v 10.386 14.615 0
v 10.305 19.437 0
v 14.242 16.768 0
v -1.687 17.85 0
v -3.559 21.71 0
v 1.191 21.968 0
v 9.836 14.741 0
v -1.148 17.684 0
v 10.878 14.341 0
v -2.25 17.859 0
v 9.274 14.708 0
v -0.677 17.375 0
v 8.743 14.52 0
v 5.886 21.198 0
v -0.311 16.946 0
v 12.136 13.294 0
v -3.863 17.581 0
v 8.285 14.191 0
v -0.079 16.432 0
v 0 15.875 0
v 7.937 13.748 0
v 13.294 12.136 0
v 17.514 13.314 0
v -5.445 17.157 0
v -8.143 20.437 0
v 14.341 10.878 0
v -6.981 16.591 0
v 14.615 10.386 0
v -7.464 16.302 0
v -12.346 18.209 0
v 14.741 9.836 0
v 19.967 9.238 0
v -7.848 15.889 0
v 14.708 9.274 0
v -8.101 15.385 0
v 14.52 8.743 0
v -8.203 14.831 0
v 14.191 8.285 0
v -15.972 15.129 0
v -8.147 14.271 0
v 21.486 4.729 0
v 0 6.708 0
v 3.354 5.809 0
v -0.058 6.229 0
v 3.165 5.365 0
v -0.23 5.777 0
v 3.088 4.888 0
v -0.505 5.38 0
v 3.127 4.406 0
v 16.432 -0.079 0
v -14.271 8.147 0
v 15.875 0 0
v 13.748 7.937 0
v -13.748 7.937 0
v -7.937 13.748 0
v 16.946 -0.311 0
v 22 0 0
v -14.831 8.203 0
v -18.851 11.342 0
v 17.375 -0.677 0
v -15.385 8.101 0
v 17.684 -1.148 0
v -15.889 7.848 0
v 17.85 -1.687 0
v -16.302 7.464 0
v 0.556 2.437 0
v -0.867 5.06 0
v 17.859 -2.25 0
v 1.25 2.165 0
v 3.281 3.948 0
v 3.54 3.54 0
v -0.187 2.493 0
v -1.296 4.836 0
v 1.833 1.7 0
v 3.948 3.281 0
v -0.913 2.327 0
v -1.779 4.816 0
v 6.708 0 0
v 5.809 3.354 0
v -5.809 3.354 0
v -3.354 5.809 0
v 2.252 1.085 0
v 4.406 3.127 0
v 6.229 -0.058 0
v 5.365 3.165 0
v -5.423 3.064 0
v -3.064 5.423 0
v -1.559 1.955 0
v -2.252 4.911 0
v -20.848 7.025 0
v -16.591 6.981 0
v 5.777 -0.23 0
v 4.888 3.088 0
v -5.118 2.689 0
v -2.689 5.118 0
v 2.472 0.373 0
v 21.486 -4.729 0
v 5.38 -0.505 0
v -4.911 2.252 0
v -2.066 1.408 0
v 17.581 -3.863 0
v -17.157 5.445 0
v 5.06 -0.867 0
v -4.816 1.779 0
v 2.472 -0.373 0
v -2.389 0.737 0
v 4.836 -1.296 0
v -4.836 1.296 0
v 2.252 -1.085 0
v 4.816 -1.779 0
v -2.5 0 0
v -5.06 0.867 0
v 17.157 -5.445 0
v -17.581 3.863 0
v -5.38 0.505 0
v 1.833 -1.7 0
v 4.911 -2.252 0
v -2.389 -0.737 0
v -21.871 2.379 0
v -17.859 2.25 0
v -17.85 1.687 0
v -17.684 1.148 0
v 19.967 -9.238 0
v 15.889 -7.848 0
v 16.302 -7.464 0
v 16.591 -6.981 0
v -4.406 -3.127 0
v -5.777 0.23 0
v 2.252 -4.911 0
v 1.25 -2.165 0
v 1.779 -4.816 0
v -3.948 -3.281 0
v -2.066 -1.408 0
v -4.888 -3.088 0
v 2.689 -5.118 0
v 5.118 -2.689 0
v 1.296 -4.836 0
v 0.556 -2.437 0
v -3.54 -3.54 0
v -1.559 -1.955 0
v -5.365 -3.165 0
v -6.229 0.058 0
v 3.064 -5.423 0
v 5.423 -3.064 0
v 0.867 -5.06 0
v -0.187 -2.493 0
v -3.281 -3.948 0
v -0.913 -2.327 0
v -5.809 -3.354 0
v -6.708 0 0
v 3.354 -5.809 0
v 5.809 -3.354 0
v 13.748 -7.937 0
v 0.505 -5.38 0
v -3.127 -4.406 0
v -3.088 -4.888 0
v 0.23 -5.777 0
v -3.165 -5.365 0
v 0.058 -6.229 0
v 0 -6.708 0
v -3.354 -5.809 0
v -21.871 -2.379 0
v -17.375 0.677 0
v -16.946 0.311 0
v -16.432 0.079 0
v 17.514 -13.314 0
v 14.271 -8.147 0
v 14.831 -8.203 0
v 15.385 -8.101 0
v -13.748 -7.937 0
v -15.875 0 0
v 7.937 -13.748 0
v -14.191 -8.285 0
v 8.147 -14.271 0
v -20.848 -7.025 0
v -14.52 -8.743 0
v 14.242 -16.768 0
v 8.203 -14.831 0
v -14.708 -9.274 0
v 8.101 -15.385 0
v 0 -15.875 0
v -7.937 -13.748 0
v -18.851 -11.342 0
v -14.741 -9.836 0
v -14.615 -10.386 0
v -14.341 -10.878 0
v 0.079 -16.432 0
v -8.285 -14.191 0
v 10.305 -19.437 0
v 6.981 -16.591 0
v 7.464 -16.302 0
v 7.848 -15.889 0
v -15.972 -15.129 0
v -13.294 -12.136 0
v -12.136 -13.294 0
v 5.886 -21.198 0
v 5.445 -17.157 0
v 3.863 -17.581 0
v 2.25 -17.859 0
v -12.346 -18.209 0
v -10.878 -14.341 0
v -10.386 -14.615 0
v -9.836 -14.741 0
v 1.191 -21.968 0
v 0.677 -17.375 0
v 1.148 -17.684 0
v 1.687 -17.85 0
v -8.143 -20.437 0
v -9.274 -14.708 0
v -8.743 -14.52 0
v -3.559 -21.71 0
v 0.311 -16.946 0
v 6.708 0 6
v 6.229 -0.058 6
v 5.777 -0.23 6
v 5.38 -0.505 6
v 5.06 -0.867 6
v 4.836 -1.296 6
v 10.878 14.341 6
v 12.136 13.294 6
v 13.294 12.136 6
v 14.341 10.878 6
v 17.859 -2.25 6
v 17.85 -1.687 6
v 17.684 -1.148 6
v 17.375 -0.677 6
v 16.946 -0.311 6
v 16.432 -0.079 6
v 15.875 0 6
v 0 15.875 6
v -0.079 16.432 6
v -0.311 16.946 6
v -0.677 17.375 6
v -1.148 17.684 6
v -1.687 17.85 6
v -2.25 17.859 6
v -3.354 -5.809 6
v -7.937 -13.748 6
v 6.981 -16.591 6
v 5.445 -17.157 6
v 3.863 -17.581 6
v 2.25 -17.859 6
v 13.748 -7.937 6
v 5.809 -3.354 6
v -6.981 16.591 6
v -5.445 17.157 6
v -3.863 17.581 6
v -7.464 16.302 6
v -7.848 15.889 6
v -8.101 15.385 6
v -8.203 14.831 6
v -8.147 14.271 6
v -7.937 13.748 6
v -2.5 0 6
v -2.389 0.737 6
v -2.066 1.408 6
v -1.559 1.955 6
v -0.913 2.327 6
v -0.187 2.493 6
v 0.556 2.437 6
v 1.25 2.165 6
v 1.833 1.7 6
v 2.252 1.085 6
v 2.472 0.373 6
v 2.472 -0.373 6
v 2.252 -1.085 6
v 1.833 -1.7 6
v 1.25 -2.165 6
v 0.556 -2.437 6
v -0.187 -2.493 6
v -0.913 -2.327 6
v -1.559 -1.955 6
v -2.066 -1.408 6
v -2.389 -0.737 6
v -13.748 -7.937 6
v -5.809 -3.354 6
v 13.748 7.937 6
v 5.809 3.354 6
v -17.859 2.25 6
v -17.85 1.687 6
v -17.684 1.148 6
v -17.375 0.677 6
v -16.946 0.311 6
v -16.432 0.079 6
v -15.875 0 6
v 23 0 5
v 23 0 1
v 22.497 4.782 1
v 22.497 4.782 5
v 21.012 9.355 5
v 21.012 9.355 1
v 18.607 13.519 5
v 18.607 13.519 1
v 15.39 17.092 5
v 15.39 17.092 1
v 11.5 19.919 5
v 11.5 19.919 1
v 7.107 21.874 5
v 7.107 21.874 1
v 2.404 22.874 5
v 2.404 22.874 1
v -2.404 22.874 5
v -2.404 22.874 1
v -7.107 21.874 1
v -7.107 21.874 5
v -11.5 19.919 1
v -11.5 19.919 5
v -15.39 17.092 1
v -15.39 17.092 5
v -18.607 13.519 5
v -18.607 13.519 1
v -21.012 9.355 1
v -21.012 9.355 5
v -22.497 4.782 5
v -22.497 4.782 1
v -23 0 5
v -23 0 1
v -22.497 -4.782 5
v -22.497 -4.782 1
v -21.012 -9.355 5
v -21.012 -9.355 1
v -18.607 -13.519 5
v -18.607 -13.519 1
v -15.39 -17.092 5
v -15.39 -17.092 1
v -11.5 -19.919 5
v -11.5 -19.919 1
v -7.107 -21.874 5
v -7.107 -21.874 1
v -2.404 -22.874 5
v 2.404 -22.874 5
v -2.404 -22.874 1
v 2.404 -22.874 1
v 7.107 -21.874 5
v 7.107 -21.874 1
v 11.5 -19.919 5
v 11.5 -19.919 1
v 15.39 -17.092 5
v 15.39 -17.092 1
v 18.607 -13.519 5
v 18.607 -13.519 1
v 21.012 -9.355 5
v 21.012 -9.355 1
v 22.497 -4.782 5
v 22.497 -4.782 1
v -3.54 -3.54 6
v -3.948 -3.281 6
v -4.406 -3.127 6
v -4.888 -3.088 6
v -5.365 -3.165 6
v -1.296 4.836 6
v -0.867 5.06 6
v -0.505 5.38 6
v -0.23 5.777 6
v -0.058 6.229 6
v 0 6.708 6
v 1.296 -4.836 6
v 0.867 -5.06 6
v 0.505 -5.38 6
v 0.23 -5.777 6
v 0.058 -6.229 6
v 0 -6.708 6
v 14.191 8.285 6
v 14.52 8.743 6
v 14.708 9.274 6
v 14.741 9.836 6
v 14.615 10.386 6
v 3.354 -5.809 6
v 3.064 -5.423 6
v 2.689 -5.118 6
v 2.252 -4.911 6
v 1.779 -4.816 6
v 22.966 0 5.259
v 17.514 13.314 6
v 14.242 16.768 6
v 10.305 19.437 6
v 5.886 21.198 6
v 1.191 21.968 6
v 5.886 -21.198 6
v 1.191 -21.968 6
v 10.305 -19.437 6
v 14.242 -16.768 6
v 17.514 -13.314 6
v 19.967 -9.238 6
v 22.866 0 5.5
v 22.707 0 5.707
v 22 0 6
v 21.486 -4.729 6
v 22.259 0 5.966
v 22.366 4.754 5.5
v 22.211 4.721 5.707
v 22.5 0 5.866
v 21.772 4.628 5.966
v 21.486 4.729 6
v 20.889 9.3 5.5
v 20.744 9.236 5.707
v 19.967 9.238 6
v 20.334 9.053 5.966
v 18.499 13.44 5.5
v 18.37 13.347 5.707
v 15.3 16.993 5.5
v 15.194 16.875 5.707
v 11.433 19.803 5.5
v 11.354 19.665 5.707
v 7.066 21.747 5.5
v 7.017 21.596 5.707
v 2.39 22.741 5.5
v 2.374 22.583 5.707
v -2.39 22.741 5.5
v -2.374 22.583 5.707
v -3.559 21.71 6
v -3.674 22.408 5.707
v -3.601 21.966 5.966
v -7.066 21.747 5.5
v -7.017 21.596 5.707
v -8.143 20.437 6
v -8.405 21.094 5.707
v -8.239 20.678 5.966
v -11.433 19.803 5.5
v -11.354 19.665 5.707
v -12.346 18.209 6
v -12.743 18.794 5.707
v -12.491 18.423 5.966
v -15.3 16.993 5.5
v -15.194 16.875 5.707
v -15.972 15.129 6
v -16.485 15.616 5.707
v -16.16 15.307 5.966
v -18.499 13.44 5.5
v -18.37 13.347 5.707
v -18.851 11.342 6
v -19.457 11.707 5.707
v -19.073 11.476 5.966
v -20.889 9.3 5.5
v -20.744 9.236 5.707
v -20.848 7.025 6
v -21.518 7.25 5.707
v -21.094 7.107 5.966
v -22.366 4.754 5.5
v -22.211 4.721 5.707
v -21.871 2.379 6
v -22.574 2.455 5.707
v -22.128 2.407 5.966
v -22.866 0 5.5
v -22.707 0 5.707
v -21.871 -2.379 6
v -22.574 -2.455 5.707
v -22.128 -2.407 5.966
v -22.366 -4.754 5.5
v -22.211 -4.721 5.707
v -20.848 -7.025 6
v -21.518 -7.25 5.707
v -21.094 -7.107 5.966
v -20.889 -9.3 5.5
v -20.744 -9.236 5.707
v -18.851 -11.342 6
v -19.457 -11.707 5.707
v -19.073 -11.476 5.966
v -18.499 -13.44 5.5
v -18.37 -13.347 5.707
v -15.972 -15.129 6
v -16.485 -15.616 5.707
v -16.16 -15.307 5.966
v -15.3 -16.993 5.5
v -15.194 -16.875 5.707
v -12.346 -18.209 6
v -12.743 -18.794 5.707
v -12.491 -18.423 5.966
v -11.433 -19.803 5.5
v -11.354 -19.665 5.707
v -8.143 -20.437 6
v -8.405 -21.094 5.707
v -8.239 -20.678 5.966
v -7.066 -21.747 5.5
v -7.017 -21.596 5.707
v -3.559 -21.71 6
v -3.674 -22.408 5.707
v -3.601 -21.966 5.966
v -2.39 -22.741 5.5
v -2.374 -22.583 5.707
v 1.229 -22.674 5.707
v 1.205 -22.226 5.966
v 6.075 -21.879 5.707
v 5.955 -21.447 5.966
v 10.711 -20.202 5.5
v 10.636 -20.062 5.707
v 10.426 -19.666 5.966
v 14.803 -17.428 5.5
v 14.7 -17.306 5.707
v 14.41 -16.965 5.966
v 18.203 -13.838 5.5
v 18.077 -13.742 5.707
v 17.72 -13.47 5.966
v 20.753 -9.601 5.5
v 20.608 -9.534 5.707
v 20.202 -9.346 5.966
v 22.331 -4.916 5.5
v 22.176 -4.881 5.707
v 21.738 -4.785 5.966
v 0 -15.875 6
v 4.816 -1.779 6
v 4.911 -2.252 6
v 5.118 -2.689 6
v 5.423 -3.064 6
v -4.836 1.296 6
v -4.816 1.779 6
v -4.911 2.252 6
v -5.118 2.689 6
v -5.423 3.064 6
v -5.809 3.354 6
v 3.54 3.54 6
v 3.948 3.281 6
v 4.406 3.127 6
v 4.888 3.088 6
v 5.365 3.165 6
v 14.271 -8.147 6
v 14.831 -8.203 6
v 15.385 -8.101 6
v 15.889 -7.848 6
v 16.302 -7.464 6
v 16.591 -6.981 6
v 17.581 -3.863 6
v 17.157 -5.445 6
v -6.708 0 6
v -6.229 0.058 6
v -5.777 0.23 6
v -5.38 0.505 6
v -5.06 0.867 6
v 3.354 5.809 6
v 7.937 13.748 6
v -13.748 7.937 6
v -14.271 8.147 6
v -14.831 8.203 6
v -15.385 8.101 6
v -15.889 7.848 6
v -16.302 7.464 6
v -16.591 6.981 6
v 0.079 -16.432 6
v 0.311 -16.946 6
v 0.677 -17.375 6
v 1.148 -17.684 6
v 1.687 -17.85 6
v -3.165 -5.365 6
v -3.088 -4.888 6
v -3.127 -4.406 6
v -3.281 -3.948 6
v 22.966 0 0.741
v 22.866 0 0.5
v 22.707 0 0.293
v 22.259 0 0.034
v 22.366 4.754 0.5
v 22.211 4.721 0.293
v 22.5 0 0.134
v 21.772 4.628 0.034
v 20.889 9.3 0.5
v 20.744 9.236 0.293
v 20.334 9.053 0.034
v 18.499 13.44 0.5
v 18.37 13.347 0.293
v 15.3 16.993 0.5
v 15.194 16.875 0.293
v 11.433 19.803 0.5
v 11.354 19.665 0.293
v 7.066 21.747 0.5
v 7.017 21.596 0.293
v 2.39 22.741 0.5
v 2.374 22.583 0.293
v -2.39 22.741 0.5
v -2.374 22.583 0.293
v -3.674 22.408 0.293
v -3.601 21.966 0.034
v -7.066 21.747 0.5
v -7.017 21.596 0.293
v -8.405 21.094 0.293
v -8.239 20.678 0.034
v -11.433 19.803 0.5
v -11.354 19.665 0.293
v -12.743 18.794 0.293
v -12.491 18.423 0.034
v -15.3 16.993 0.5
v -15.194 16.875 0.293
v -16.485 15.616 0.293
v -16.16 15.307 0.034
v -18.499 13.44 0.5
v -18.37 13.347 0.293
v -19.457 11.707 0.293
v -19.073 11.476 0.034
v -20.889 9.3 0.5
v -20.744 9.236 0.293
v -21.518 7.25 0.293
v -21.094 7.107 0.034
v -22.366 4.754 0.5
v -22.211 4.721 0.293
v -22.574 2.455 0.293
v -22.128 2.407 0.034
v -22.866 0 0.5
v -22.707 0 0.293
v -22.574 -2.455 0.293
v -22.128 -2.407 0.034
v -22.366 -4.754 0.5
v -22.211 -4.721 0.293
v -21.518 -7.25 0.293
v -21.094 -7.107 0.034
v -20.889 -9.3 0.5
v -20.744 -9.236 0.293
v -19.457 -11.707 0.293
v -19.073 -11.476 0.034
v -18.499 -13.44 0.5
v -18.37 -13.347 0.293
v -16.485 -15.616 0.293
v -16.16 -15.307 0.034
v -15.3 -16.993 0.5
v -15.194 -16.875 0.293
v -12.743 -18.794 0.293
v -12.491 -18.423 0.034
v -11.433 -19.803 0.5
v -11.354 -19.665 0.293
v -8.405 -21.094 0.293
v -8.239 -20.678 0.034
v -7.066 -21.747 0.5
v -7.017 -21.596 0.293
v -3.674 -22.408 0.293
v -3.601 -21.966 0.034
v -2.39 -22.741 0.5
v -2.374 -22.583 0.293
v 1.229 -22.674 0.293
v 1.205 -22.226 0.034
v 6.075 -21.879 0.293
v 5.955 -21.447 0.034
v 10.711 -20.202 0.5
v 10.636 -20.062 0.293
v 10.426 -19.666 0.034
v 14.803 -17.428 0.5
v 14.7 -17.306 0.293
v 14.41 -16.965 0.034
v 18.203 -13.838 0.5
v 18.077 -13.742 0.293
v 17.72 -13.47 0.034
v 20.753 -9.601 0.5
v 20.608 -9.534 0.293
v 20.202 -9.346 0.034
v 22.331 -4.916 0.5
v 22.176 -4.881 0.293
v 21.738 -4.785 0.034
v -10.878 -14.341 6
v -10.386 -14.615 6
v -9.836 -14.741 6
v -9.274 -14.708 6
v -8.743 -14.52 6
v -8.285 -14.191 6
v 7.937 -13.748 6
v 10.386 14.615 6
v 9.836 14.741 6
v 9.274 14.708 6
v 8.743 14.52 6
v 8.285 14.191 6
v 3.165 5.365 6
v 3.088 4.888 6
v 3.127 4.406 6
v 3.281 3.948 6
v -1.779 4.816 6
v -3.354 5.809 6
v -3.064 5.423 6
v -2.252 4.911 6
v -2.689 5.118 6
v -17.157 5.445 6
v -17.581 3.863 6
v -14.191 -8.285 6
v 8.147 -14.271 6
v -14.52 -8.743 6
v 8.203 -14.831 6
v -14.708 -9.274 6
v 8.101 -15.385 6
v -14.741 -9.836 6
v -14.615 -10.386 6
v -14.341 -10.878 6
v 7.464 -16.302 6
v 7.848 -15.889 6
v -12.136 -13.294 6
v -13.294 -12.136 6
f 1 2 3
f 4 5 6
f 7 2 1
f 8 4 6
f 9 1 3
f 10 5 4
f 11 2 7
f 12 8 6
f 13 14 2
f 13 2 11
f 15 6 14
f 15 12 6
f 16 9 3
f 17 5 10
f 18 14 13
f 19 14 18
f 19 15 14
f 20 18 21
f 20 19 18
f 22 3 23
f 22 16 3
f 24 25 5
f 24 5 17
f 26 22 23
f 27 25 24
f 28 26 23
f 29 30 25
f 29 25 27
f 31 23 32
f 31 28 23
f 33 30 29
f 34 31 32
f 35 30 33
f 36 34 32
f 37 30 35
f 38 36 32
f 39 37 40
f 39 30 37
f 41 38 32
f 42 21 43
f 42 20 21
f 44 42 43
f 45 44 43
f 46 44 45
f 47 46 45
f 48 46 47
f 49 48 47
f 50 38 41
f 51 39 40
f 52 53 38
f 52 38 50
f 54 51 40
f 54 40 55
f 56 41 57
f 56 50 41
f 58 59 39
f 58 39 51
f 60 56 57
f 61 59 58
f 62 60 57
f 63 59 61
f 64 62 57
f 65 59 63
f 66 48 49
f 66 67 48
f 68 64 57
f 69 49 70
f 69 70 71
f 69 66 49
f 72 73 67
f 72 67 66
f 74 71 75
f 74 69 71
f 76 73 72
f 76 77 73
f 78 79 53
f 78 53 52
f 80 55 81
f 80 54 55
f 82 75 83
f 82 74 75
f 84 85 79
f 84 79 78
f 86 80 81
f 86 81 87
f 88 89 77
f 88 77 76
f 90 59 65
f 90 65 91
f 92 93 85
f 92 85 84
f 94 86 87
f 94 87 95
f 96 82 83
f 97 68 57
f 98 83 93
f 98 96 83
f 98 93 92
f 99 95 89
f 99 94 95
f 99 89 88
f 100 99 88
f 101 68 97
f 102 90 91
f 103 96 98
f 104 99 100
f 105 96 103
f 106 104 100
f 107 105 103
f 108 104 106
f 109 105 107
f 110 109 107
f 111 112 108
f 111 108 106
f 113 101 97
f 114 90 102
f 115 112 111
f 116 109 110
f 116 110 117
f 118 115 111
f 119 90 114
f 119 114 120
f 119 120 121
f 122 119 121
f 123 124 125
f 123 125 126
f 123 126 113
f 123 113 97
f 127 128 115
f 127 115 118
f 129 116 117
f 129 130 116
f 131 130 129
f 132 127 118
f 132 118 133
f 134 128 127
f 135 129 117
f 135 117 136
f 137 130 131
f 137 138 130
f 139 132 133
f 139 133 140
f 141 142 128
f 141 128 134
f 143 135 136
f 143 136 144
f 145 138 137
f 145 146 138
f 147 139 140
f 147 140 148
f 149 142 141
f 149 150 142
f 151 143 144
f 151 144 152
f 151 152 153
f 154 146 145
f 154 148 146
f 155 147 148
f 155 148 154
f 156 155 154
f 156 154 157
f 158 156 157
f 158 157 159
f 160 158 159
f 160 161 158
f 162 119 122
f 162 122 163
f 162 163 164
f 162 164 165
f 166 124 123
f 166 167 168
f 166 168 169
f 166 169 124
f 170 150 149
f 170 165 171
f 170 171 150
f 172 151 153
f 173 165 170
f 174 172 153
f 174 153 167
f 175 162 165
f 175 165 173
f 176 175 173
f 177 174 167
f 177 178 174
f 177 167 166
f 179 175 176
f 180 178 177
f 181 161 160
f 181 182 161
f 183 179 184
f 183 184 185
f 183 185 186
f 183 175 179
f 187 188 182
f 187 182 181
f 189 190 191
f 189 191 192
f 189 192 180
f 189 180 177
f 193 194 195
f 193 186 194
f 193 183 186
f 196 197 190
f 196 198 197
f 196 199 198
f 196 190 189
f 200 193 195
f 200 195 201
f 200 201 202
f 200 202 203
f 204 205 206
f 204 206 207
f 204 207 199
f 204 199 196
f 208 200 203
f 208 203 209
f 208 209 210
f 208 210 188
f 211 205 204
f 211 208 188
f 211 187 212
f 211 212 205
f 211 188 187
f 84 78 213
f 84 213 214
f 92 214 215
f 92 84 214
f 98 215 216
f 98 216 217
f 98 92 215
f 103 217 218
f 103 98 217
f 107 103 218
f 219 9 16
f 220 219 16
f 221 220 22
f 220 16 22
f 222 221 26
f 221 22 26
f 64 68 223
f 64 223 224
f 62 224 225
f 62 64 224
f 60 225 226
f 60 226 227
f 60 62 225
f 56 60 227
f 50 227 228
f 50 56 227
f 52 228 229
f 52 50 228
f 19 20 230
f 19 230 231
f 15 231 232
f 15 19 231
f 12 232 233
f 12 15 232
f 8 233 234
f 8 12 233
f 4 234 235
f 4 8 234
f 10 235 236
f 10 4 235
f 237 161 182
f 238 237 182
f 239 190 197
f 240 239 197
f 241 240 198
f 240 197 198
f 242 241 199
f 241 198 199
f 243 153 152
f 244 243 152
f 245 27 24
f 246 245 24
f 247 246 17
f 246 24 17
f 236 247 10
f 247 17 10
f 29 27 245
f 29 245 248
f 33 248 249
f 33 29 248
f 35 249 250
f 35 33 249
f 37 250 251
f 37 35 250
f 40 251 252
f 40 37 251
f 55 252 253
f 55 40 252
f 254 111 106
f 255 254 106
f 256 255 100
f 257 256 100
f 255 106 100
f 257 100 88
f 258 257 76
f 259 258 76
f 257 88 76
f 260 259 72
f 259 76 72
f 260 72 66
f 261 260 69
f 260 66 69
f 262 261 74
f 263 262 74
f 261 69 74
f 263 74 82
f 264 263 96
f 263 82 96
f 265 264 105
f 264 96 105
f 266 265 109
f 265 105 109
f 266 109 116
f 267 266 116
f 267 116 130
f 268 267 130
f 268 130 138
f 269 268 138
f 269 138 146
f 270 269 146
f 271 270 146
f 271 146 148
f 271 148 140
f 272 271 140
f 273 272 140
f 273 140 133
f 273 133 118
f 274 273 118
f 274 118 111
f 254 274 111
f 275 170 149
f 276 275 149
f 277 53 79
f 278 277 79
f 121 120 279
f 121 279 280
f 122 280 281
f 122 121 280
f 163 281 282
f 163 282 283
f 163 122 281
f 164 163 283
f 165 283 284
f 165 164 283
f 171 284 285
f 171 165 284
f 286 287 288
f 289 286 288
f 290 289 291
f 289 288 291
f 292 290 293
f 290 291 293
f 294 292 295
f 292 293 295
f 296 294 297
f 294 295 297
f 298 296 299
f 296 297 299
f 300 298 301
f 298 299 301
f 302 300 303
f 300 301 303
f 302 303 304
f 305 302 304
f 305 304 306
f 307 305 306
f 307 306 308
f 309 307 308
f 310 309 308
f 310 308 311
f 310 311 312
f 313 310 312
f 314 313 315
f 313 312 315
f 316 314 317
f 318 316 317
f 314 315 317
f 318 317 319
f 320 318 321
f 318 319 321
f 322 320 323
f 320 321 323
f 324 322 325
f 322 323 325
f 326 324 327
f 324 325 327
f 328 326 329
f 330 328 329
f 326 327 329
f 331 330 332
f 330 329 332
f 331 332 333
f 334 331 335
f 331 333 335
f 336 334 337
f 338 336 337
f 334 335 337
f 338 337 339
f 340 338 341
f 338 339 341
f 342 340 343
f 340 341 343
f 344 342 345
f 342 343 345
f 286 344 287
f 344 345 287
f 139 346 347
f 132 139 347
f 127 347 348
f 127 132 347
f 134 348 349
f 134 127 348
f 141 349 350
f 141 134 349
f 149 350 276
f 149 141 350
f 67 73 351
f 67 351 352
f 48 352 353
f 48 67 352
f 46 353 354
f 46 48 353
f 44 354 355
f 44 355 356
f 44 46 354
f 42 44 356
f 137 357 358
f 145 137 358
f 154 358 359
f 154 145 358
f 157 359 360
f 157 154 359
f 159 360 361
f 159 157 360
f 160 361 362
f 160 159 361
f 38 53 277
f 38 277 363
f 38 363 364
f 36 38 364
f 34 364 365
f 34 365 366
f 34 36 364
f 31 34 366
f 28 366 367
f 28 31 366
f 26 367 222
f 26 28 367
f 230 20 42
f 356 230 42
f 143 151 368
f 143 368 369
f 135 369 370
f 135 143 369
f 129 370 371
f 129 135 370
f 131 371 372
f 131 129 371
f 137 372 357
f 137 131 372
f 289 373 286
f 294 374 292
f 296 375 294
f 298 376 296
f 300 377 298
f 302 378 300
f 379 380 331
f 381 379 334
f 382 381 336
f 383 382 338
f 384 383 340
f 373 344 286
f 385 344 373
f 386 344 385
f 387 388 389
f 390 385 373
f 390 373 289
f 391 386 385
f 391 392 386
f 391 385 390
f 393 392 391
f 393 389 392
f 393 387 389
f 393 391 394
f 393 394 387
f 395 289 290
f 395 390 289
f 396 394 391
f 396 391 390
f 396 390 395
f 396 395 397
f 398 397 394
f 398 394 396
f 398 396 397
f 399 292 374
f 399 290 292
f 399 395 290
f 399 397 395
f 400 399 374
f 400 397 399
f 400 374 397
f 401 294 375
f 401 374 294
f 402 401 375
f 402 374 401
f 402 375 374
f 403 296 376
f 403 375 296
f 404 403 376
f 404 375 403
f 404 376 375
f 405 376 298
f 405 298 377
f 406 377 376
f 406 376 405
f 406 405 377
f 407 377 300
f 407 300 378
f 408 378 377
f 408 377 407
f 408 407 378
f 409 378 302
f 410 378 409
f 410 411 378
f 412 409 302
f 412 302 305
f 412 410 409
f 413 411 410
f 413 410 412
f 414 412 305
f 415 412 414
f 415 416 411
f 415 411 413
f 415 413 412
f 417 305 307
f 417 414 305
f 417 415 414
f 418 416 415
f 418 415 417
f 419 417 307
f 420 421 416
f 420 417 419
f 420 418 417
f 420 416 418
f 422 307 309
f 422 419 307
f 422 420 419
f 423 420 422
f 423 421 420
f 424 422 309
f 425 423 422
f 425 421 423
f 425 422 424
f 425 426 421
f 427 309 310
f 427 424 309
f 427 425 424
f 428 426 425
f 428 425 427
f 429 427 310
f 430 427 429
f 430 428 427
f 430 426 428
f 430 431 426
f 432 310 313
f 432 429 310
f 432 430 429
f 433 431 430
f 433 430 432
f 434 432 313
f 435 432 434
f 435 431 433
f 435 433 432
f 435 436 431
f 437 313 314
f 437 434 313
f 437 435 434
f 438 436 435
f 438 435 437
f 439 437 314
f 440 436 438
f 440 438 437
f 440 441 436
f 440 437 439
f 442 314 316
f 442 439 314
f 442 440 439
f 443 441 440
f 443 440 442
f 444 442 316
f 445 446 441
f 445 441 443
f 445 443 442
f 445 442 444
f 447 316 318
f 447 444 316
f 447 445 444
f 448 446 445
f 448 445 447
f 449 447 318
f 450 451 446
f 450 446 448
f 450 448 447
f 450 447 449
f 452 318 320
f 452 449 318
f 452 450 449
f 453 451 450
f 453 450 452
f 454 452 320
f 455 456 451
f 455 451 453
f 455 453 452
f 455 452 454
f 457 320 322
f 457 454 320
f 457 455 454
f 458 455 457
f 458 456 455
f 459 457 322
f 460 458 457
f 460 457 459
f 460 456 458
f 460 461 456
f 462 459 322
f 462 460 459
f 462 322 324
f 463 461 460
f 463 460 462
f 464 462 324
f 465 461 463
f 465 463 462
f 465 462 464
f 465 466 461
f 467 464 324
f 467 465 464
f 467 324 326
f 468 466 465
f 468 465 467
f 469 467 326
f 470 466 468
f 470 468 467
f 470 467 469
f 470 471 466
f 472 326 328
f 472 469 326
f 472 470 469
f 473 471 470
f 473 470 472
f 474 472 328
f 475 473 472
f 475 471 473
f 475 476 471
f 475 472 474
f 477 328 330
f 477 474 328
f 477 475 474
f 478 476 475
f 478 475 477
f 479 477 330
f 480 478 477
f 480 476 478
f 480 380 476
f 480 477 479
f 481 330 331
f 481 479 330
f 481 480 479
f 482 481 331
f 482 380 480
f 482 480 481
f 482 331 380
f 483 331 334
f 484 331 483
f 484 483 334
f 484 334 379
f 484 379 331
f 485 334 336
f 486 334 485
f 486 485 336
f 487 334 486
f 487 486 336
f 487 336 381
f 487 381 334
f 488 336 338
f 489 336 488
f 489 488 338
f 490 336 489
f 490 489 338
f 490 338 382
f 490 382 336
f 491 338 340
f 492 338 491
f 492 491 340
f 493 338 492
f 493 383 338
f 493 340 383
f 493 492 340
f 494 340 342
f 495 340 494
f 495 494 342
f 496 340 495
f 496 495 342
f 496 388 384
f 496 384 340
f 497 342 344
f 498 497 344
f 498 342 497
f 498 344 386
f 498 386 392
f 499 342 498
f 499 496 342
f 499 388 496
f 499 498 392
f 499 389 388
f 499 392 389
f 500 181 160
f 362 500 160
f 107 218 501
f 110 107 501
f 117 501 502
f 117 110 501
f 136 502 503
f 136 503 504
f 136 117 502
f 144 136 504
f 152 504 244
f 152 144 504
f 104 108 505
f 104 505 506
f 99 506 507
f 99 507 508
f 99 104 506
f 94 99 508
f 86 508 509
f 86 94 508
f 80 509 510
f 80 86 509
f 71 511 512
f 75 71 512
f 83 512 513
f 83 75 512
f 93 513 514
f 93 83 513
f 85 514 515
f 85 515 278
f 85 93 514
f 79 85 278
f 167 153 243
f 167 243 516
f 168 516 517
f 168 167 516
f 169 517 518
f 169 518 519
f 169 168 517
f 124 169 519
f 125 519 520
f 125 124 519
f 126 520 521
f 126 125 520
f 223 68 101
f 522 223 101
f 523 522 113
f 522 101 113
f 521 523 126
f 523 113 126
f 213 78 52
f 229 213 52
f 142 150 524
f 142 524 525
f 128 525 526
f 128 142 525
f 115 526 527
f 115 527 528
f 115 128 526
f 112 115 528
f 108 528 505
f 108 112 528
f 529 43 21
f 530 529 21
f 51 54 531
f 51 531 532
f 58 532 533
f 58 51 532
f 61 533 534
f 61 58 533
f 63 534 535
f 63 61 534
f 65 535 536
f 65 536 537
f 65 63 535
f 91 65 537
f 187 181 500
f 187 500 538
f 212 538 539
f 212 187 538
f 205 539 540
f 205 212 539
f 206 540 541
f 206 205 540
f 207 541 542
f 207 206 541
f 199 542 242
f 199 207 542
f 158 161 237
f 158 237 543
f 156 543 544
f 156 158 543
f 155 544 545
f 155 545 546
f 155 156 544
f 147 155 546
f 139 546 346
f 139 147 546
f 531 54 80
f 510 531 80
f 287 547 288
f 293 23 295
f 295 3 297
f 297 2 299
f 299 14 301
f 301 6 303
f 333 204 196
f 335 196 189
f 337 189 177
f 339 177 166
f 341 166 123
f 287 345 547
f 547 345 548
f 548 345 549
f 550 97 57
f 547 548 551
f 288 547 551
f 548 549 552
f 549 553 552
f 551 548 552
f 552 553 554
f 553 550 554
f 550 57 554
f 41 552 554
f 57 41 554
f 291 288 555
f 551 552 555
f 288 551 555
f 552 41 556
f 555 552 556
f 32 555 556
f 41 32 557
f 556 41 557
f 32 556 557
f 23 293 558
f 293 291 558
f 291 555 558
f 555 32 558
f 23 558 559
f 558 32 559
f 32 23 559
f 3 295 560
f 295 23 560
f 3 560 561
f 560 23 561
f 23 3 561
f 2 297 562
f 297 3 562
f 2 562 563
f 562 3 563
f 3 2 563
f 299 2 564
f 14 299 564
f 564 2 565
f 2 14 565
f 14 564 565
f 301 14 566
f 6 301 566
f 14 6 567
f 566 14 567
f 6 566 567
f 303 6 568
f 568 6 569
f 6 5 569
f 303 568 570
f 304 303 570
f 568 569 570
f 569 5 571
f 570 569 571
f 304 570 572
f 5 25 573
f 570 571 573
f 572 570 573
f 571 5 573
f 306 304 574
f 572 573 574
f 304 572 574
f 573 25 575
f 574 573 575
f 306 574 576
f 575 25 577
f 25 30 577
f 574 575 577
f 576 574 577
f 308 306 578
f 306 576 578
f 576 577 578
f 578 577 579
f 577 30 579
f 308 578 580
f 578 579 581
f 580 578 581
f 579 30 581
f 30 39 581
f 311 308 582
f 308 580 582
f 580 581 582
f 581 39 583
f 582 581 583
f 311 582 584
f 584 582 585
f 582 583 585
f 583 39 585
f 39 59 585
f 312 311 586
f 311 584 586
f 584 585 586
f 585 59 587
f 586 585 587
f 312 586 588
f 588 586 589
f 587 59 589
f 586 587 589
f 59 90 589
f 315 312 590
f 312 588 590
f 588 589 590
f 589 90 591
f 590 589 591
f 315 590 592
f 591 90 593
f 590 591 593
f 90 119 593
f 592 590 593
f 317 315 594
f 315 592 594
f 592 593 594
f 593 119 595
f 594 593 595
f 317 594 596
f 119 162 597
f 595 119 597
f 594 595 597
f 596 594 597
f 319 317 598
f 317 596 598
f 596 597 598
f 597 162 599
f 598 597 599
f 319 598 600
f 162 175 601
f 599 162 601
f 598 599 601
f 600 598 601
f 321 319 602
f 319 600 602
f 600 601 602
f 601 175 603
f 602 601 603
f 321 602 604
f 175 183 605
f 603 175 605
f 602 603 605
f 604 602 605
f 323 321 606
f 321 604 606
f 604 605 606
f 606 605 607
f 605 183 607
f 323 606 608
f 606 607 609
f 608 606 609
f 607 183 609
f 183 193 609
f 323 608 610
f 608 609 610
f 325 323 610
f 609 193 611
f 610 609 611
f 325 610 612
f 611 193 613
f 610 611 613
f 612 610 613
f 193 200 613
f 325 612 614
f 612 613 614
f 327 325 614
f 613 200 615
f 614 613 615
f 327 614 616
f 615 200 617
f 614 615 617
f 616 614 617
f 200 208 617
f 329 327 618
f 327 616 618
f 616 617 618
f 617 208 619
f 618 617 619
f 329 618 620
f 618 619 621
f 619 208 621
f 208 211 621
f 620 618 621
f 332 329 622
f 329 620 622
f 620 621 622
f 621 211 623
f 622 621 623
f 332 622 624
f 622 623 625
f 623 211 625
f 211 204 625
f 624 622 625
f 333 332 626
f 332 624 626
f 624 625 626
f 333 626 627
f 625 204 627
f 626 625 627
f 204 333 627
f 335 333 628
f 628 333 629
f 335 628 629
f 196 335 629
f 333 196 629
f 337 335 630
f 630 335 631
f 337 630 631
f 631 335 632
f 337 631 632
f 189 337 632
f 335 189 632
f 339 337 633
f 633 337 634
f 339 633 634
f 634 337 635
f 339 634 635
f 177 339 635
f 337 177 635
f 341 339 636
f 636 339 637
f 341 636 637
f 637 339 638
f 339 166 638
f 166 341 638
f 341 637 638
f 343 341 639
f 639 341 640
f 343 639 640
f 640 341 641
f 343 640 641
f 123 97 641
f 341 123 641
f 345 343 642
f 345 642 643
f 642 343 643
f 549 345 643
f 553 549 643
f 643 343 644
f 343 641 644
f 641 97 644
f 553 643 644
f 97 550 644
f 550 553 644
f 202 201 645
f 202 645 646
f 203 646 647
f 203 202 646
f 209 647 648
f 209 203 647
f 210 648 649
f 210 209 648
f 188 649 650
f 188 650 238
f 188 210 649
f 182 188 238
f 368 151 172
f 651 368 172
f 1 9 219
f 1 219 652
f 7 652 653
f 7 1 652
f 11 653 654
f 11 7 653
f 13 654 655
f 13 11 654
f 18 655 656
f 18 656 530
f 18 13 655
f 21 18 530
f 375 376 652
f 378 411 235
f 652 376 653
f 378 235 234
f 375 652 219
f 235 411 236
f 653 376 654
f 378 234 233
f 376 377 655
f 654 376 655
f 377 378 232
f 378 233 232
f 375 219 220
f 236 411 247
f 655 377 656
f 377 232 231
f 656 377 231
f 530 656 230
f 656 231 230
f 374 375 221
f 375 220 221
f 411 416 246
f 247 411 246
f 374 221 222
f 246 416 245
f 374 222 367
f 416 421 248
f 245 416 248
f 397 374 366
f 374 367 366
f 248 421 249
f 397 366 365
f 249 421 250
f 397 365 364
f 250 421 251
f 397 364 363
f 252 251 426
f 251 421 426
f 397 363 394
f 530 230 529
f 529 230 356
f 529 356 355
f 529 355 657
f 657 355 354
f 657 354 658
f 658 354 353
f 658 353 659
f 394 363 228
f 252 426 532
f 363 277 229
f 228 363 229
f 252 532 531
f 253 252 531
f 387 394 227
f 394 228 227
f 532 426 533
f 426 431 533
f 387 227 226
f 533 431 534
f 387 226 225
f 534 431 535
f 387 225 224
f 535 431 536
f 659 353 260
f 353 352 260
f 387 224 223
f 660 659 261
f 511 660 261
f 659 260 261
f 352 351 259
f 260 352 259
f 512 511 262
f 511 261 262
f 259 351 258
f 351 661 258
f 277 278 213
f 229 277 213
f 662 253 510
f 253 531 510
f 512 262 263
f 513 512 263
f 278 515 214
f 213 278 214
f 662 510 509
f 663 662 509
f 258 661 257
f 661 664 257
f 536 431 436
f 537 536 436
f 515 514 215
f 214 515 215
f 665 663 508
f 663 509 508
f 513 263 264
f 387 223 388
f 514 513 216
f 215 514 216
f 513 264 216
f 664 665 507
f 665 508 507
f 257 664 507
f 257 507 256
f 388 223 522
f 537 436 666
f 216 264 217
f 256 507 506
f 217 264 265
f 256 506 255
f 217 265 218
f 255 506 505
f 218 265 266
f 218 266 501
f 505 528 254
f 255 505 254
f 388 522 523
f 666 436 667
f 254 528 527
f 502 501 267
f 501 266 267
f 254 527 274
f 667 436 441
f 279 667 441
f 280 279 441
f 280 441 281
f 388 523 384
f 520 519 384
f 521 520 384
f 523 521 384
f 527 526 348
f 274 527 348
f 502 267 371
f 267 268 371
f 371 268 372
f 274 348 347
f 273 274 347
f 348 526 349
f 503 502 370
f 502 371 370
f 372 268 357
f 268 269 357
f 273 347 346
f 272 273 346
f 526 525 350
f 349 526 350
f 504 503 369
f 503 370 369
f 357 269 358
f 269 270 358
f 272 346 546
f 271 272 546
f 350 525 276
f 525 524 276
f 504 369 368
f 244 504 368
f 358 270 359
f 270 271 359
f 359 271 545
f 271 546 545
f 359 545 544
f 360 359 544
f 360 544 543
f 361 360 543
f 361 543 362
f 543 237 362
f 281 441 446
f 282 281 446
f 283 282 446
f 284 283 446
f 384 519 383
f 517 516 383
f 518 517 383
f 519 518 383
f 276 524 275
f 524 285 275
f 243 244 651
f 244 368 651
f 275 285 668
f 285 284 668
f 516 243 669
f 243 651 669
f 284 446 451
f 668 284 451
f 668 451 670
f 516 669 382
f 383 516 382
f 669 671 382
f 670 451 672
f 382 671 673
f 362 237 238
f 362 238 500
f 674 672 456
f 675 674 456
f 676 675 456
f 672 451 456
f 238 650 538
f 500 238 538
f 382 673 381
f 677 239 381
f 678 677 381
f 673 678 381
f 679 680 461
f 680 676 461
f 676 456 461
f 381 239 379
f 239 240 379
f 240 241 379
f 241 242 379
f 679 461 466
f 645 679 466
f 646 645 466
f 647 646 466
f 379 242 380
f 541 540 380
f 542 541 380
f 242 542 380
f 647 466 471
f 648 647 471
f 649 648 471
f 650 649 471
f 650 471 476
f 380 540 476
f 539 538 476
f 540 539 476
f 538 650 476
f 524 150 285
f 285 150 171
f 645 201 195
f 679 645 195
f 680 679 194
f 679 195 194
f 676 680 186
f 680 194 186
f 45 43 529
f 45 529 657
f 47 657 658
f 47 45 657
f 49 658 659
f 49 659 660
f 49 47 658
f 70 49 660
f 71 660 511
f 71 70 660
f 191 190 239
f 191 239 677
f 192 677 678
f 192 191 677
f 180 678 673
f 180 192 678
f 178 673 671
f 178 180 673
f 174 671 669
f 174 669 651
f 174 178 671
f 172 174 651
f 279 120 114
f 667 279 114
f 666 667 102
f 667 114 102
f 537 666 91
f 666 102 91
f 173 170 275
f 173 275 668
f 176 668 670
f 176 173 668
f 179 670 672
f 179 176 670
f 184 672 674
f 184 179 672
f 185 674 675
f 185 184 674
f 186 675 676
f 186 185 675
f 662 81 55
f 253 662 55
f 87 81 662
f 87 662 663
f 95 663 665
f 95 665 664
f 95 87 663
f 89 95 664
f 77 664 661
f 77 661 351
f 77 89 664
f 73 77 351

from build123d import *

# Parameters (mm, degrees)
SKETCH1_R           = 23
BOSS_EXTRUDE1_DEPTH = 6
FILLET1_R           = 1
CUT_EXTRUDE1_DEPTH  = 34.075670817082454
SKETCH3_R           = 2.5
CUT_EXTRUDE2_DEPTH  = 8
FILLET2_R           = 2


with BuildPart() as part:
    # Sketch1 → Boss-Extrude1 (new body)
    with BuildSketch(Plane.XY):
        Circle(SKETCH1_R)
    extrude(amount=BOSS_EXTRUDE1_DEPTH)

    # Fillet1
    fillet1_edges = [part.edges().sort_by_distance(p)[0] for p in [
        (-23, 2.82e-15, 0),
        (-23, 2.82e-15, 6),
    ]]
    fillet(fillet1_edges, radius=FILLET1_R)

    # Sketch2 → Cut-Extrude1 (cut, through all)
    with BuildSketch(Plane(origin=(0, 0, 0), x_dir=(-1, 0, 0), z_dir=(0, 0, -1))):
        with BuildLine():
            Line((0, 18), (0, 4.999999999999997))
            ThreePointArc((0, 4.999999999999997), (1.2940952255126064, 4.829629131445338), (2.500000000000004, 4.330127018922188))
            Line((2.500000000000004, 4.330127018922188), (9.000000000000016, 15.588457268119884))
            ThreePointArc((9.000000000000016, 15.588457268119884), (4.658742811845384, 17.386664873203223), (0, 18))
        make_face()
        with BuildLine():
            Line((15.588457268119916, 8.999999999999963), (4.330127018922196, 2.499999999999989))
            ThreePointArc((4.330127018922196, 2.499999999999989), (4.829629131445343, 1.294095225512589), (4.999999999999997, -1.746e-14))
            Line((4.999999999999997, -1.746e-14), (18, -6.285e-14))
            ThreePointArc((18, -6.285e-14), (17.386664873203244, 4.658742811845323), (15.588457268119916, 8.999999999999963))
        make_face()
        with BuildLine():
            Line((15.588457268119898, -8.999999999999995), (4.330127018922192, -2.4999999999999973))
            ThreePointArc((4.330127018922192, -2.4999999999999973), (3.5355339059327373, -3.5355339059327355), (2.500000000000001, -4.330127018922191))
            Line((2.500000000000001, -4.330127018922191), (9.000000000000007, -15.588457268119889))
            ThreePointArc((9.000000000000007, -15.588457268119889), (12.72792206135786, -12.727922061357848), (15.588457268119898, -8.999999999999995))
        make_face()
        with BuildLine():
            Line((3.97e-15, -18), (9.6e-16, -4.999999999999997))
            ThreePointArc((9.6e-16, -4.999999999999997), (-1.2940952255126013, -4.82962913144534), (-2.499999999999997, -4.330127018922192))
            Line((-2.499999999999997, -4.330127018922192), (-8.999999999999993, -15.588457268119898))
            ThreePointArc((-8.999999999999993, -15.588457268119898), (-4.658742811845367, -17.38666487320323), (3.97e-15, -18))
        make_face()
        with BuildLine():
            Line((-15.588457268119889, -9.000000000000009), (-4.330127018922191, -2.5000000000000013))
            ThreePointArc((-4.330127018922191, -2.5000000000000013), (-4.829629131445345, -1.2940952255125773), (-4.9999999999999964, 5.237e-14))
            Line((-4.9999999999999964, 5.237e-14), (-18, 5.83e-15))
            ThreePointArc((-18, 5.83e-15), (-17.38666487320323, -4.658742811845374), (-15.588457268119889, -9.000000000000009))
        make_face()
        with BuildLine():
            Line((-15.58845726811979, 9.000000000000181), (-4.330127018922163, 2.500000000000049))
            ThreePointArc((-4.330127018922163, 2.500000000000049), (-3.5355339059326933, 3.5355339059327786), (-2.499999999999943, 4.330127018922223))
            Line((-2.499999999999943, 4.330127018922223), (-8.9999999999998, 15.588457268120008))
            ThreePointArc((-8.9999999999998, 15.588457268120008), (-12.7279220613577, 12.727922061358008), (-15.58845726811979, 9.000000000000181))
        make_face()
    extrude(amount=-CUT_EXTRUDE1_DEPTH, mode=Mode.SUBTRACT)

    # Sketch3 → Cut-Extrude2 (cut)
    with BuildSketch(Plane(origin=(0, 0, 0), x_dir=(-1, 0, 0), z_dir=(0, 0, -1))):
        Circle(SKETCH3_R)
    extrude(amount=-CUT_EXTRUDE2_DEPTH, mode=Mode.SUBTRACT)

    # Fillet2
    # the kernel refuses this fillet: 2 mm, written as the material it adds along each edge
    with BuildSketch(Plane(origin=(8.9999999999998, 15.58845726812001, 0), x_dir=(0.8330141641507608, -0.5532516627396699, 0), z_dir=(0, 0, 1))) as fillet2_piece_1:
        with BuildLine():
            CenterArc((2.1291790264677095, -1.996074518473306), FILLET2_R, 86.40962210927087, 97.18075578145812)
            Line((0.13310450799440263, -2.121320343559637), (0, 0))
            ThreePointArc((0, 0), (1.127212425777022, 0.03532933374024082), (2.2544248515540453, -1.2e-16))
        make_face()
    extrude(amount=6)
    with BuildSketch(Plane(origin=(15.58845726811979, 9.000000000000181, 0), x_dir=(-0.5532516627396912, 0.8330141641507466, 0), z_dir=(0, 0, 1))) as fillet2_piece_2:
        with BuildLine():
            CenterArc((2.1291790264677095, 1.9960745184733064), FILLET2_R, 176.40962210927088, 97.18075578145823)
            Line((0.13310450799440354, 2.1213203435596415), (0, 0))
            ThreePointArc((0, 0), (1.127212425777022, -0.03532933374024257), (2.2544248515540453, 9e-17))
        make_face()
    extrude(amount=6)
    with BuildSketch(Plane(origin=(2.499999999999943, 4.330127018922223, 0), x_dir=(0.4999999999999891, 0.8660254037844449, 0), z_dir=(0, 0, 1))) as fillet2_piece_3:
        with BuildLine():
            CenterArc((1.7082039324998066, -1.9999999999999998), FILLET2_R, 90.00000000000001, 73.39845040098082)
            ThreePointArc((-0.2084257625000237, -1.4285714285714644), (-0.05238081560950268, -0.7218479107478997), (0, 0))
            Line((0, 0), (1.7082039324998062, 0))
        make_face()
    extrude(amount=6)
    with BuildSketch(Plane(origin=(4.330127018922163, 2.5000000000000484, 0), x_dir=(0.8660254037844327, 0.5000000000000103, 0), z_dir=(0, 0, 1))) as fillet2_piece_4:
        with BuildLine():
            CenterArc((1.708203932499807, 2), FILLET2_R, 196.6015495990192, 73.39845040098078)
            ThreePointArc((-0.20842576250002318, 1.428571428571463), (-0.05238081560950245, 0.7218479107478992), (0, 0))
            Line((0, 0), (1.7082039324998068, -6e-17))
        make_face()
    extrude(amount=6)
    with BuildSketch(Plane(origin=(15.588457268119889, -9.000000000000009, 0), x_dir=(-0.8660254037844383, 0.5000000000000009, 0), z_dir=(0, 0, 1))) as fillet2_piece_5:
        with BuildLine():
            CenterArc((2.1254921336124535, -2), FILLET2_R, 89.99999999999999, 97.18075578145834)
            ThreePointArc((0.14117865031401003, -2.250000000000001), (0.03532933374023933, -1.1272124257770224), (0, 0))
            Line((0, 0), (2.125492133612454, -1.1e-16))
        make_face()
    extrude(amount=6)
    with BuildSketch(Plane(origin=(18, 5.83e-15, 0), x_dir=(-1, 3.63e-15, 0), z_dir=(0, 0, 1))) as fillet2_piece_6:
        with BuildLine():
            CenterArc((2.1254921336124433, 2), FILLET2_R, 172.81924421854202, 97.18075578145795)
            ThreePointArc((0.14117865031399895, 2.2499999999999902), (0.03532933374023574, 1.1272124257770182), (0, 0))
            Line((0, 0), (2.1254921336124433, 0))
        make_face()
    extrude(amount=6)
    with BuildSketch(Plane(origin=(4.330127018922191, -2.5000000000000018, 0), x_dir=(0.36973419276377445, 0.9291375714614709, 0), z_dir=(0, 0, 1))) as fillet2_piece_7:
        with BuildLine():
            CenterArc((1.7324349857948858, -1.9790476737562004), FILLET2_R, 98.30077479950961, 73.39845040099217)
            Line((-0.2466126879613723, -1.690308509457446), (0, 0))
            ThreePointArc((0, 0), (0.7218479107478688, -0.05238081560949556), (1.4436958214957383, 0))
        make_face()
    extrude(amount=6)
    with BuildSketch(Plane(origin=(4.9999999999999964, 5.25e-14, 0), x_dir=(-0.14436958214956583, -0.9895238368781015, 0), z_dir=(0, 0, 1))) as fillet2_piece_8:
        with BuildLine():
            CenterArc((1.7324349857949062, 1.9790476737562006), FILLET2_R, 188.3007747994978, 73.39845040099254)
            Line((-0.246612687961354, 1.6903085094574617), (0, 0))
            ThreePointArc((0, 0), (0.7218479107478792, 0.05238081560949936), (1.4436958214957574, 0))
        make_face()
    extrude(amount=6)
    with BuildSketch(Plane(origin=(-3.43e-15, -18, 0), x_dir=(0.9980372592366533, 0.06262291254316825, 0), z_dir=(0, 0, 1))) as fillet2_piece_9:
        with BuildLine():
            CenterArc((2.129179026467711, 1.996074518473307), FILLET2_R, 176.4096221092709, 97.18075578145829)
            Line((0.13310450799440432, 2.121320343559642), (0, 0))
            ThreePointArc((0, 0), (1.1272124257770224, -0.03532933374023745), (2.254424851554048, 3e-17))
        make_face()
    extrude(amount=6)
    with BuildSketch(Plane(origin=(8.999999999999993, -15.588457268119898, 0), x_dir=(-0.8956370766939215, -0.44478559649697147, 0), z_dir=(0, 0, 1))) as fillet2_piece_10:
        with BuildLine():
            CenterArc((2.129179026467713, -1.9960745184733077), FILLET2_R, 86.40962210927084, 97.1807557814584)
            Line((0.1331045079944061, -2.121320343559647), (0, 0))
            ThreePointArc((0, 0), (1.1272124257770244, 0.03532933374023982), (2.2544248515540497, 8e-17))
        make_face()
    extrude(amount=6)
    with BuildSketch(Plane(origin=(2.4999999999999973, -4.330127018922191, 0), x_dir=(0.4999999999999994, -0.8660254037844389, 0), z_dir=(0, 0, 1))) as fillet2_piece_11:
        with BuildLine():
            CenterArc((1.7082039324998068, -1.9999999999999998), FILLET2_R, 90.00000000000001, 73.39845040098074)
            ThreePointArc((-0.20842576250002273, -1.428571428571461), (-0.05238081560950084, -0.7218479107478981), (0, 0))
            Line((0, 0), (1.7082039324998066, 2e-17))
        make_face()
    extrude(amount=6)
    with BuildSketch(Plane(origin=(-9.6e-16, -4.9999999999999964, 0), x_dir=(-2.2e-16, -1, 0), z_dir=(0, 0, 1))) as fillet2_piece_12:
        with BuildLine():
            CenterArc((1.7082039324998068, 2), FILLET2_R, 196.6015495990192, 73.39845040098078)
            ThreePointArc((-0.2084257625000235, 1.4285714285714635), (-0.0523808156095013, 0.7218479107478993), (0, 0))
            Line((0, 0), (1.7082039324998064, 0))
        make_face()
    extrude(amount=6)
    with BuildSketch(Plane(origin=(-9.000000000000007, -15.588457268119889, 0), x_dir=(-0.8330141641507522, 0.5532516627396828, 0), z_dir=(0, 0, 1))) as fillet2_piece_13:
        with BuildLine():
            CenterArc((2.1291790264677144, -1.9960745184733075), FILLET2_R, 86.40962210927094, 97.18075578145817)
            Line((0.13310450799440787, -2.121320343559643), (0, 0))
            ThreePointArc((0, 0), (1.1272124257770235, 0.03532933374024261), (2.2544248515540475, 4e-17))
        make_face()
    extrude(amount=6)
    with BuildSketch(Plane(origin=(-2.500000000000001, -4.330127018922191, 0), x_dir=(-0.5000000000000007, -0.8660254037844384, 0), z_dir=(0, 0, 1))) as fillet2_piece_14:
        with BuildLine():
            CenterArc((1.7082039324998013, -2), FILLET2_R, 90.00000000000001, 73.39845040098085)
            ThreePointArc((-0.20842576250002953, -1.428571428571465), (-0.05238081560950266, -0.7218479107479008), (0, 0))
            Line((0, 0), (1.7082039324998008, -1e-17))
        make_face()
    extrude(amount=6)
    with BuildSketch(Plane(origin=(-4.330127018922191, -2.4999999999999973, 0), x_dir=(-0.8660254037844389, -0.4999999999999994, 0), z_dir=(0, 0, 1))) as fillet2_piece_15:
        with BuildLine():
            CenterArc((1.7082039324998053, 2), FILLET2_R, 196.60154959901914, 73.39845040098089)
            ThreePointArc((-0.20842576250002512, 1.428571428571465), (-0.05238081560950129, 0.7218479107479002), (0, 0))
            Line((0, 0), (1.7082039324998066, -2e-17))
        make_face()
    extrude(amount=6)
    with BuildSketch(Plane(origin=(-15.588457268119896, -8.999999999999996, 0), x_dir=(0.5532516627396812, -0.8330141641507532, 0), z_dir=(0, 0, 1))) as fillet2_piece_16:
        with BuildLine():
            CenterArc((2.129179026467709, 1.996074518473306), FILLET2_R, 176.4096221092708, 97.18075578145829)
            Line((0.1331045079944023, 2.1213203435596437), (0, 0))
            ThreePointArc((0, 0), (1.127212425777022, -0.03532933374023939), (2.2544248515540444, -1.1e-16))
        make_face()
    extrude(amount=6)
    with BuildSketch(Plane(origin=(-4.999999999999998, -1.714e-14, 0), x_dir=(-1, -3.62e-15, 0), z_dir=(0, 0, 1))) as fillet2_piece_17:
        with BuildLine():
            CenterArc((1.7082039324997937, -2), FILLET2_R, 90, 73.39845040098072)
            ThreePointArc((-0.20842576250003547, -1.4285714285714597), (-0.05238081560950375, -0.7218479107478981), (0, 0))
            Line((0, 0), (1.708203932499794, 0))
        make_face()
    extrude(amount=6)
    with BuildSketch(Plane(origin=(-4.330127018922196, 2.499999999999989, 0), x_dir=(-0.8660254037844398, 0.49999999999999784, 0), z_dir=(0, 0, 1))) as fillet2_piece_18:
        with BuildLine():
            CenterArc((1.7082039324998106, 2), FILLET2_R, 196.60154959901917, 73.39845040098083)
            ThreePointArc((-0.20842576250002, 1.4285714285714646), (-0.05238081560950151, 0.7218479107478999), (0, 0))
            Line((0, 0), (1.708203932499811, -2e-17))
        make_face()
    extrude(amount=6)
    with BuildSketch(Plane(origin=(-18, -6.285e-14, 0), x_dir=(0.06262291254316511, 0.9980372592366534, 0), z_dir=(0, 0, 1))) as fillet2_piece_19:
        with BuildLine():
            CenterArc((2.129179026467712, -1.996074518473306), FILLET2_R, 86.4096221092709, 97.18075578145834)
            Line((0.13310450799440612, -2.121320343559647), (0, 0))
            ThreePointArc((0, 0), (1.1272124257770233, 0.0353293337402411), (2.254424851554047, 0))
        make_face()
    extrude(amount=6)
    with BuildSketch(Plane(origin=(-15.588457268119917, 8.999999999999963, 0), x_dir=(-0.4447855964969697, -0.8956370766939222, 0), z_dir=(0, 0, 1))) as fillet2_piece_20:
        with BuildLine():
            CenterArc((2.1291790264677113, 1.9960745184733066), FILLET2_R, 176.40962210927077, 97.18075578145834)
            Line((0.13310450799440465, 2.1213203435596455), (0, 0))
            ThreePointArc((0, 0), (1.1272124257770235, -0.03532933374024044), (2.254424851554046, -6e-17))
        make_face()
    extrude(amount=6)
    with BuildSketch(Plane(origin=(-2.2e-16, 18, 0), x_dir=(-0.9980372592366533, -0.06262291254316824, 0), z_dir=(0, 0, 1))) as fillet2_piece_21:
        with BuildLine():
            CenterArc((2.1291790264677126, 1.996074518473307), FILLET2_R, 176.40962210927086, 97.18075578145829)
            Line((0.13310450799440565, 2.1213203435596437), (0, 0))
            ThreePointArc((0, 0), (1.1272124257770244, -0.03532933374024468), (2.254424851554049, 0))
        make_face()
    extrude(amount=6)
    with BuildSketch(Plane(origin=(-9.000000000000018, 15.588457268119885, 0), x_dir=(0.5000000000000014, -0.8660254037844377, 0), z_dir=(0, 0, 1))) as fillet2_piece_22:
        with BuildLine():
            CenterArc((2.125492133612456, 2), FILLET2_R, 172.81924421854168, 97.18075578145829)
            ThreePointArc((0.1411786503140125, 2.2500000000000018), (0.03532933374024108, 1.1272124257770235), (0, 0))
            Line((0, 0), (2.1254921336124544, 1.2e-16))
        make_face()
    extrude(amount=6)
    with BuildSketch(Plane(origin=(0, 4.9999999999999964, 0), x_dir=(-0.9895238368781003, -0.14436958214957385, 0), z_dir=(0, 0, 1))) as fillet2_piece_23:
        with BuildLine():
            CenterArc((1.732434985794886, -1.9790476737562013), FILLET2_R, 98.30077479950961, 73.39845040099226)
            Line((-0.24661268796137278, -1.6903085094574508), (0, 0))
            ThreePointArc((0, 0), (0.7218479107478691, -0.05238081560949842), (1.4436958214957385, -2e-17))
        make_face()
    extrude(amount=6)
    with BuildSketch(Plane(origin=(-2.500000000000004, 4.330127018922187, 0), x_dir=(-0.5000000000000007, 0.8660254037844383, 0), z_dir=(0, 0, 1))) as fillet2_piece_24:
        with BuildLine():
            CenterArc((1.7082039324998055, -2), FILLET2_R, 90.00000000000001, 73.39845040098085)
            ThreePointArc((-0.20842576250002545, -1.4285714285714655), (-0.05238081560950322, -0.7218479107479004), (0, 0))
            Line((0, 0), (1.708203932499805, 1e-17))
        make_face()
    extrude(amount=6)


solid = part.part
